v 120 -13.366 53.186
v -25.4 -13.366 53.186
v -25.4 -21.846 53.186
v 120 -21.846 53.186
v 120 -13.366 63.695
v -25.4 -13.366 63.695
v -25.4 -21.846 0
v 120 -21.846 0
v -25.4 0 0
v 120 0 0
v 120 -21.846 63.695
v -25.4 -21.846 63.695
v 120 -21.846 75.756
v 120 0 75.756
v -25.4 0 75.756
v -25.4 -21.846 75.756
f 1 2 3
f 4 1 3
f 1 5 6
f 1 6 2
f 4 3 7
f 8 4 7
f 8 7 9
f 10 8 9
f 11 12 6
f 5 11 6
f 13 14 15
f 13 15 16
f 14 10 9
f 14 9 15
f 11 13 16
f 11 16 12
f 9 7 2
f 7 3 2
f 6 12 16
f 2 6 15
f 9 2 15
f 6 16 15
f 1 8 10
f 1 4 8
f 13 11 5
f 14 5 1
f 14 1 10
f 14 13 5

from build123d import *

# Parameters (mm, degrees)
F1_DEPTH      = 120
F1_DEPTH_BACK = 25.4


with BuildPart() as f1:
    # F0 (on Right) → F1 (new body, two sides)
    with BuildSketch(Plane.YZ) as f1_sk:
        Polygon((-21.846049, 0), (0, 0), (0, 75.75617), (-21.846049, 75.75617), (-21.846049, 63.694596), (-13.365726, 63.694596), (-13.365726, 53.186368), (-21.846049, 53.186368), align=None)
    extrude(amount=F1_DEPTH)
    extrude(f1_sk.sketch, amount=-F1_DEPTH_BACK)


solid = f1.part
